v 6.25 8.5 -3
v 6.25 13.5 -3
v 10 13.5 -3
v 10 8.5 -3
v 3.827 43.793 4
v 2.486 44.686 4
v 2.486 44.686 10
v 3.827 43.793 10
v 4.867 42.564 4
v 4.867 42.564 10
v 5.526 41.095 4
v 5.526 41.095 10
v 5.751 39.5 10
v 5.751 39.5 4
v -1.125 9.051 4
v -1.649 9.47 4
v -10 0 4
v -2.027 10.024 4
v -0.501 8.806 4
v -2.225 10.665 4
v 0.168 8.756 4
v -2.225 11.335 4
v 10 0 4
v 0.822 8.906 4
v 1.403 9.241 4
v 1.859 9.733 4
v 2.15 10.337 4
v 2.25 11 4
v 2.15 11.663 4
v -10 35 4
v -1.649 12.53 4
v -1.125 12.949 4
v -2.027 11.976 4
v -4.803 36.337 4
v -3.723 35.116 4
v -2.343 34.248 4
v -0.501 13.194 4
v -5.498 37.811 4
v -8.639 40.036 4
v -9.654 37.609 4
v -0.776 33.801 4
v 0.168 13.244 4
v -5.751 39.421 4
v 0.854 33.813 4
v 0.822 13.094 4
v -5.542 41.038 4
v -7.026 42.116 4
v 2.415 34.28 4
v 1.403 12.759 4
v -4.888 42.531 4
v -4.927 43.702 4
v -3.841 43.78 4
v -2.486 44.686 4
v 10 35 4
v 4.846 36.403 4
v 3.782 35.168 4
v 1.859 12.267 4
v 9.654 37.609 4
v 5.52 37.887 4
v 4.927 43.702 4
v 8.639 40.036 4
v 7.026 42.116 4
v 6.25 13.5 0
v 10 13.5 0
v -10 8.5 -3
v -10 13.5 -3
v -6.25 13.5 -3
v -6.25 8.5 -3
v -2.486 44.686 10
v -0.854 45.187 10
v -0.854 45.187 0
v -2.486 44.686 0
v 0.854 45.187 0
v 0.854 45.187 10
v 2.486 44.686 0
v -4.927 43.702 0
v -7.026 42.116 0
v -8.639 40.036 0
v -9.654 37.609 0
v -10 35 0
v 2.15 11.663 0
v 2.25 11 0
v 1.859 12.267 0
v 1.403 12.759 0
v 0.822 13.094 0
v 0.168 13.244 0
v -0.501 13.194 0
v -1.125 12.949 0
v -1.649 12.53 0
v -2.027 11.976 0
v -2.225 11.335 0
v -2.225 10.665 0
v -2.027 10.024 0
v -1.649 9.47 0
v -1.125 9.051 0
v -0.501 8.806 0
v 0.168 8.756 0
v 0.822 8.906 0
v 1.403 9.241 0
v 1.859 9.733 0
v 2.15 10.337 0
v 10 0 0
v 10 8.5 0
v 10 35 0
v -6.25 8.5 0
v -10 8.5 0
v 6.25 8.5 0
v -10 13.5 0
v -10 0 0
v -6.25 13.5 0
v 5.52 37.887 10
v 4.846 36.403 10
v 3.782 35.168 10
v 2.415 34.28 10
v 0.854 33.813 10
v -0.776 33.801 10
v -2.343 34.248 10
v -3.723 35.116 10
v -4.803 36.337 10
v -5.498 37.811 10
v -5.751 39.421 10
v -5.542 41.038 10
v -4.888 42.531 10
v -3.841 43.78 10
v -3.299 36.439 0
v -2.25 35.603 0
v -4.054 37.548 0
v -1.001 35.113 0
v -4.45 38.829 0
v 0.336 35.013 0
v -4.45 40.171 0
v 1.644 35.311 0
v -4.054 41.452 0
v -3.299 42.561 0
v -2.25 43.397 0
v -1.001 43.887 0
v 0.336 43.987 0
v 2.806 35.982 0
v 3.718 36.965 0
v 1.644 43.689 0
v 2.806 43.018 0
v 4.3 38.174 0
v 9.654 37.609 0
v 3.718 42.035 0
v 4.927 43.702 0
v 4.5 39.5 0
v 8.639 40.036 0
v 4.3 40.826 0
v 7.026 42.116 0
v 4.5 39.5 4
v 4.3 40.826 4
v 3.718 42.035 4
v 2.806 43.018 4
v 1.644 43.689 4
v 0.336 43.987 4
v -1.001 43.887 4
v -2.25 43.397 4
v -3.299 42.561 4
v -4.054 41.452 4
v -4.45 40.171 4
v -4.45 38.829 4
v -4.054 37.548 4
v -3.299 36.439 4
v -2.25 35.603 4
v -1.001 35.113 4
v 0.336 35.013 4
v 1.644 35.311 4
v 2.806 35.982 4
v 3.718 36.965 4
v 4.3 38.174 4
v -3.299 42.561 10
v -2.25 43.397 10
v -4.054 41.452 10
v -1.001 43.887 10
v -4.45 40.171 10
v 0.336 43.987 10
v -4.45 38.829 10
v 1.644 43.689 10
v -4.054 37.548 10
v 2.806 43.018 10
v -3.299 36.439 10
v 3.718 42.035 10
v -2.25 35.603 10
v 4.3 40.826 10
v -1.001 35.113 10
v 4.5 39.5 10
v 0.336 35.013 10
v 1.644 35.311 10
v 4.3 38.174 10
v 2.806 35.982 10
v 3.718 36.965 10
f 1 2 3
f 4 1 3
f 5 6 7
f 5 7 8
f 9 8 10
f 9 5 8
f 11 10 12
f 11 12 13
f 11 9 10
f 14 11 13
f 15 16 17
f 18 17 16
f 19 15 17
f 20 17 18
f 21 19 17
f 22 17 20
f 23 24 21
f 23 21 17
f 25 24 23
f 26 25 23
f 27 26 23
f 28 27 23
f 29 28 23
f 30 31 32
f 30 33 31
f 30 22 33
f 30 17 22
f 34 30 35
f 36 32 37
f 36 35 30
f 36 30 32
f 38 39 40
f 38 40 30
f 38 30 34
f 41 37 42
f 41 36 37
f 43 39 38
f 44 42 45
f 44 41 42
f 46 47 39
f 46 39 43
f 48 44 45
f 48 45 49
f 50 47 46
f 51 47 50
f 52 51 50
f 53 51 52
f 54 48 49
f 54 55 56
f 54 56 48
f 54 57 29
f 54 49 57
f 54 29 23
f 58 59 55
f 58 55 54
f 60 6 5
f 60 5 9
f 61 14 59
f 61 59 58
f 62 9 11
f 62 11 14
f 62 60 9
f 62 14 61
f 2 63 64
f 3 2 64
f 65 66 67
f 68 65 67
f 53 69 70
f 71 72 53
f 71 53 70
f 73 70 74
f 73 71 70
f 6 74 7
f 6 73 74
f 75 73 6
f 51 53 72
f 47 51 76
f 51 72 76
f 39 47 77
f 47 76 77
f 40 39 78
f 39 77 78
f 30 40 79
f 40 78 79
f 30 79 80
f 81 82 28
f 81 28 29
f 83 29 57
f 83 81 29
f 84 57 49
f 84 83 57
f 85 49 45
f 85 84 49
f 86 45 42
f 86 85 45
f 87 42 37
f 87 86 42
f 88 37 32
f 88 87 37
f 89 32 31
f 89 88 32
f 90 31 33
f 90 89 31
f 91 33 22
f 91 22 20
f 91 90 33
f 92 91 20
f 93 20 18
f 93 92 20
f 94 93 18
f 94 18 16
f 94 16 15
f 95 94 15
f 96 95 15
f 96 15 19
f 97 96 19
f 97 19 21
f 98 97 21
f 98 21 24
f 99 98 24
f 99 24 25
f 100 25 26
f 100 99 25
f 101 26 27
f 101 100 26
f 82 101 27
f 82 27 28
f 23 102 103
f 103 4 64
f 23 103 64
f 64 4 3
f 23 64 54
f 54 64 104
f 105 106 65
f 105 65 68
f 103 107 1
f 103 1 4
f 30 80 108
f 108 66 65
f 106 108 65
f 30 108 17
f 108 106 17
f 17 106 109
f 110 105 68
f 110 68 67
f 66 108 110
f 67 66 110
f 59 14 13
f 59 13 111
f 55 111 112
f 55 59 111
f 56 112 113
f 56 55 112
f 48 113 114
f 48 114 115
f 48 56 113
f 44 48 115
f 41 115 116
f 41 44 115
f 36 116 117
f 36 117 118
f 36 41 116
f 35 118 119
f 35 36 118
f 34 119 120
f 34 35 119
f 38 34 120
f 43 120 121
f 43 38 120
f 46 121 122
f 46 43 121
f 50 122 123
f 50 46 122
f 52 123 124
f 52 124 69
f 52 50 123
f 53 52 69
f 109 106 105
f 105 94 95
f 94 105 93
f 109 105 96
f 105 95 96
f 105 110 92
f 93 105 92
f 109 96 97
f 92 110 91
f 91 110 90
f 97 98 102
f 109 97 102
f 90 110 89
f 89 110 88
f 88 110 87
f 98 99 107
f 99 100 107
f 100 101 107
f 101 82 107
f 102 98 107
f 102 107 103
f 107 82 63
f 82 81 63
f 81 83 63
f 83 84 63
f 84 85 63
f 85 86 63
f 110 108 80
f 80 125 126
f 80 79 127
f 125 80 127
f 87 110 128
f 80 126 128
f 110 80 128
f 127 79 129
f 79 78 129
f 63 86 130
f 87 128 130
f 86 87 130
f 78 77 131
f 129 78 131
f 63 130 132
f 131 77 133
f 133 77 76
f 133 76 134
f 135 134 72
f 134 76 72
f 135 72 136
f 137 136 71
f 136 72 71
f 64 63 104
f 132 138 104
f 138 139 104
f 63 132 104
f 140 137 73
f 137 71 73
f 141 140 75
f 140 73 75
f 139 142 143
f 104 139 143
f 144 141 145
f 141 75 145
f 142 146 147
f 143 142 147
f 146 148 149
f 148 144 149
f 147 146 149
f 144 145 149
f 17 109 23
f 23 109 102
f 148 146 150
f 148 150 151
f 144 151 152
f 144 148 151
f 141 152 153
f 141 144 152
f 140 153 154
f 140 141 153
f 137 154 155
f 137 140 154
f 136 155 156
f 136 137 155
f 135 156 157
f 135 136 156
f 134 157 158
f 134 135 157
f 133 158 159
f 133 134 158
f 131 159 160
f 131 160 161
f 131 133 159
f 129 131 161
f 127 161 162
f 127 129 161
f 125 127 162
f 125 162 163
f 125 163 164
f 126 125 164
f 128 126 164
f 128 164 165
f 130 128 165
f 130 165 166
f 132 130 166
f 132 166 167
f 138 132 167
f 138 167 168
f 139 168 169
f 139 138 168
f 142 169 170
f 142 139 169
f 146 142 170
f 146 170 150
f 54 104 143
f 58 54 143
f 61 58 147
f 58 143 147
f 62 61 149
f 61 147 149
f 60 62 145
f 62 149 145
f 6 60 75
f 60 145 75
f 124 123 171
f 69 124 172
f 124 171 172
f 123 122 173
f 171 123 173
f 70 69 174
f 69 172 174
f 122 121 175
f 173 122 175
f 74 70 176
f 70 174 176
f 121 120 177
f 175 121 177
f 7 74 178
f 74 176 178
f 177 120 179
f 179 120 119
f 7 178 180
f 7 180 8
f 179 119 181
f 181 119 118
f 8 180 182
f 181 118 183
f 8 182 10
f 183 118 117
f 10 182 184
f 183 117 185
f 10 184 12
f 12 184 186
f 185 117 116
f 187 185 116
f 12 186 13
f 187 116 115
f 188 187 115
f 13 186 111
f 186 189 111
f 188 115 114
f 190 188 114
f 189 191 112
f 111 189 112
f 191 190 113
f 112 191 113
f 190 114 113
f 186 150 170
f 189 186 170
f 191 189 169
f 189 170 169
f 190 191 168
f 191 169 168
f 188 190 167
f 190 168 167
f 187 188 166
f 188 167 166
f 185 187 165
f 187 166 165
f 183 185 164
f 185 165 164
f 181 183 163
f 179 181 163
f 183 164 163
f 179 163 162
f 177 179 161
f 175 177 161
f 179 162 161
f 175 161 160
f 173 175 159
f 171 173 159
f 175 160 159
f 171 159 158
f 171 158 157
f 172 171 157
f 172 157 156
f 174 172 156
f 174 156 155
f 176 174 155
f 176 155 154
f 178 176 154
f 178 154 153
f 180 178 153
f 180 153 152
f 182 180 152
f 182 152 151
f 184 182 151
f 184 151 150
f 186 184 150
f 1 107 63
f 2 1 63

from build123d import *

# Parameters (mm, degrees)
F0_R     = 2.25
F0_R_2   = 4.5
F1_DEPTH = 4
F2_W     = 3.75
F2_H     = 5
F3_DEPTH = 3
F4_R     = 4.5
F5_DEPTH = 10


with BuildPart() as f1:
    # F0 (on Top) → F1 (new body)
    with BuildSketch(Plane.XY):
        with BuildLine():
            Line((-10, 35), (-10, 0))
            Line((-10, 0), (10, 0))
            Line((10, 0), (10, 35))
            ThreePointArc((10, 35), (0, 45), (-10, 35))
        make_face()
        with Locations((0, 11)):
            Circle(F0_R, mode=Mode.SUBTRACT)
        with Locations((0, 39.5)):
            Circle(F0_R_2, mode=Mode.SUBTRACT)
    extrude(amount=F1_DEPTH)

    # F2 (on Top) → F3 (join)
    with BuildSketch(Plane.XY):
        with Locations((-8.125, 11)):
            Rectangle(F2_W, F2_H)
        with Locations((8.125, 11)):
            Rectangle(F2_W, F2_H)
    extrude(amount=-F3_DEPTH)

    # F4 (on face) → F5 (join)
    with BuildSketch(Plane(origin=(0, 0, 0), x_dir=(1, 0, 0), z_dir=(0, 0, -1))):
        with BuildLine():
            ThreePointArc((2.4862908139, -44.6859877136), (4.8669921435, -42.5640656083), (5.7511834067, -39.5))
            ThreePointArc((5.7511834067, -39.5), (-3.0640656083, -34.6330078565), (-2.4862908139, -44.6859877136))
            ThreePointArc((-2.4862908139, -44.6859877136), (0, -45), (2.4862908139, -44.6859877136))
        make_face()
        with Locations((0, -39.5)):
            Circle(F4_R, mode=Mode.SUBTRACT)
        with BuildLine():
            ThreePointArc((2.4862908139, -44.6859877136), (0, -45), (-2.4862908139, -44.6859877136))
            ThreePointArc((-2.4862908139, -44.6859877136), (0, -45.2511834067), (2.4862908139, -44.6859877136))
        make_face()
    extrude(amount=-F5_DEPTH)


solid = f1.part
